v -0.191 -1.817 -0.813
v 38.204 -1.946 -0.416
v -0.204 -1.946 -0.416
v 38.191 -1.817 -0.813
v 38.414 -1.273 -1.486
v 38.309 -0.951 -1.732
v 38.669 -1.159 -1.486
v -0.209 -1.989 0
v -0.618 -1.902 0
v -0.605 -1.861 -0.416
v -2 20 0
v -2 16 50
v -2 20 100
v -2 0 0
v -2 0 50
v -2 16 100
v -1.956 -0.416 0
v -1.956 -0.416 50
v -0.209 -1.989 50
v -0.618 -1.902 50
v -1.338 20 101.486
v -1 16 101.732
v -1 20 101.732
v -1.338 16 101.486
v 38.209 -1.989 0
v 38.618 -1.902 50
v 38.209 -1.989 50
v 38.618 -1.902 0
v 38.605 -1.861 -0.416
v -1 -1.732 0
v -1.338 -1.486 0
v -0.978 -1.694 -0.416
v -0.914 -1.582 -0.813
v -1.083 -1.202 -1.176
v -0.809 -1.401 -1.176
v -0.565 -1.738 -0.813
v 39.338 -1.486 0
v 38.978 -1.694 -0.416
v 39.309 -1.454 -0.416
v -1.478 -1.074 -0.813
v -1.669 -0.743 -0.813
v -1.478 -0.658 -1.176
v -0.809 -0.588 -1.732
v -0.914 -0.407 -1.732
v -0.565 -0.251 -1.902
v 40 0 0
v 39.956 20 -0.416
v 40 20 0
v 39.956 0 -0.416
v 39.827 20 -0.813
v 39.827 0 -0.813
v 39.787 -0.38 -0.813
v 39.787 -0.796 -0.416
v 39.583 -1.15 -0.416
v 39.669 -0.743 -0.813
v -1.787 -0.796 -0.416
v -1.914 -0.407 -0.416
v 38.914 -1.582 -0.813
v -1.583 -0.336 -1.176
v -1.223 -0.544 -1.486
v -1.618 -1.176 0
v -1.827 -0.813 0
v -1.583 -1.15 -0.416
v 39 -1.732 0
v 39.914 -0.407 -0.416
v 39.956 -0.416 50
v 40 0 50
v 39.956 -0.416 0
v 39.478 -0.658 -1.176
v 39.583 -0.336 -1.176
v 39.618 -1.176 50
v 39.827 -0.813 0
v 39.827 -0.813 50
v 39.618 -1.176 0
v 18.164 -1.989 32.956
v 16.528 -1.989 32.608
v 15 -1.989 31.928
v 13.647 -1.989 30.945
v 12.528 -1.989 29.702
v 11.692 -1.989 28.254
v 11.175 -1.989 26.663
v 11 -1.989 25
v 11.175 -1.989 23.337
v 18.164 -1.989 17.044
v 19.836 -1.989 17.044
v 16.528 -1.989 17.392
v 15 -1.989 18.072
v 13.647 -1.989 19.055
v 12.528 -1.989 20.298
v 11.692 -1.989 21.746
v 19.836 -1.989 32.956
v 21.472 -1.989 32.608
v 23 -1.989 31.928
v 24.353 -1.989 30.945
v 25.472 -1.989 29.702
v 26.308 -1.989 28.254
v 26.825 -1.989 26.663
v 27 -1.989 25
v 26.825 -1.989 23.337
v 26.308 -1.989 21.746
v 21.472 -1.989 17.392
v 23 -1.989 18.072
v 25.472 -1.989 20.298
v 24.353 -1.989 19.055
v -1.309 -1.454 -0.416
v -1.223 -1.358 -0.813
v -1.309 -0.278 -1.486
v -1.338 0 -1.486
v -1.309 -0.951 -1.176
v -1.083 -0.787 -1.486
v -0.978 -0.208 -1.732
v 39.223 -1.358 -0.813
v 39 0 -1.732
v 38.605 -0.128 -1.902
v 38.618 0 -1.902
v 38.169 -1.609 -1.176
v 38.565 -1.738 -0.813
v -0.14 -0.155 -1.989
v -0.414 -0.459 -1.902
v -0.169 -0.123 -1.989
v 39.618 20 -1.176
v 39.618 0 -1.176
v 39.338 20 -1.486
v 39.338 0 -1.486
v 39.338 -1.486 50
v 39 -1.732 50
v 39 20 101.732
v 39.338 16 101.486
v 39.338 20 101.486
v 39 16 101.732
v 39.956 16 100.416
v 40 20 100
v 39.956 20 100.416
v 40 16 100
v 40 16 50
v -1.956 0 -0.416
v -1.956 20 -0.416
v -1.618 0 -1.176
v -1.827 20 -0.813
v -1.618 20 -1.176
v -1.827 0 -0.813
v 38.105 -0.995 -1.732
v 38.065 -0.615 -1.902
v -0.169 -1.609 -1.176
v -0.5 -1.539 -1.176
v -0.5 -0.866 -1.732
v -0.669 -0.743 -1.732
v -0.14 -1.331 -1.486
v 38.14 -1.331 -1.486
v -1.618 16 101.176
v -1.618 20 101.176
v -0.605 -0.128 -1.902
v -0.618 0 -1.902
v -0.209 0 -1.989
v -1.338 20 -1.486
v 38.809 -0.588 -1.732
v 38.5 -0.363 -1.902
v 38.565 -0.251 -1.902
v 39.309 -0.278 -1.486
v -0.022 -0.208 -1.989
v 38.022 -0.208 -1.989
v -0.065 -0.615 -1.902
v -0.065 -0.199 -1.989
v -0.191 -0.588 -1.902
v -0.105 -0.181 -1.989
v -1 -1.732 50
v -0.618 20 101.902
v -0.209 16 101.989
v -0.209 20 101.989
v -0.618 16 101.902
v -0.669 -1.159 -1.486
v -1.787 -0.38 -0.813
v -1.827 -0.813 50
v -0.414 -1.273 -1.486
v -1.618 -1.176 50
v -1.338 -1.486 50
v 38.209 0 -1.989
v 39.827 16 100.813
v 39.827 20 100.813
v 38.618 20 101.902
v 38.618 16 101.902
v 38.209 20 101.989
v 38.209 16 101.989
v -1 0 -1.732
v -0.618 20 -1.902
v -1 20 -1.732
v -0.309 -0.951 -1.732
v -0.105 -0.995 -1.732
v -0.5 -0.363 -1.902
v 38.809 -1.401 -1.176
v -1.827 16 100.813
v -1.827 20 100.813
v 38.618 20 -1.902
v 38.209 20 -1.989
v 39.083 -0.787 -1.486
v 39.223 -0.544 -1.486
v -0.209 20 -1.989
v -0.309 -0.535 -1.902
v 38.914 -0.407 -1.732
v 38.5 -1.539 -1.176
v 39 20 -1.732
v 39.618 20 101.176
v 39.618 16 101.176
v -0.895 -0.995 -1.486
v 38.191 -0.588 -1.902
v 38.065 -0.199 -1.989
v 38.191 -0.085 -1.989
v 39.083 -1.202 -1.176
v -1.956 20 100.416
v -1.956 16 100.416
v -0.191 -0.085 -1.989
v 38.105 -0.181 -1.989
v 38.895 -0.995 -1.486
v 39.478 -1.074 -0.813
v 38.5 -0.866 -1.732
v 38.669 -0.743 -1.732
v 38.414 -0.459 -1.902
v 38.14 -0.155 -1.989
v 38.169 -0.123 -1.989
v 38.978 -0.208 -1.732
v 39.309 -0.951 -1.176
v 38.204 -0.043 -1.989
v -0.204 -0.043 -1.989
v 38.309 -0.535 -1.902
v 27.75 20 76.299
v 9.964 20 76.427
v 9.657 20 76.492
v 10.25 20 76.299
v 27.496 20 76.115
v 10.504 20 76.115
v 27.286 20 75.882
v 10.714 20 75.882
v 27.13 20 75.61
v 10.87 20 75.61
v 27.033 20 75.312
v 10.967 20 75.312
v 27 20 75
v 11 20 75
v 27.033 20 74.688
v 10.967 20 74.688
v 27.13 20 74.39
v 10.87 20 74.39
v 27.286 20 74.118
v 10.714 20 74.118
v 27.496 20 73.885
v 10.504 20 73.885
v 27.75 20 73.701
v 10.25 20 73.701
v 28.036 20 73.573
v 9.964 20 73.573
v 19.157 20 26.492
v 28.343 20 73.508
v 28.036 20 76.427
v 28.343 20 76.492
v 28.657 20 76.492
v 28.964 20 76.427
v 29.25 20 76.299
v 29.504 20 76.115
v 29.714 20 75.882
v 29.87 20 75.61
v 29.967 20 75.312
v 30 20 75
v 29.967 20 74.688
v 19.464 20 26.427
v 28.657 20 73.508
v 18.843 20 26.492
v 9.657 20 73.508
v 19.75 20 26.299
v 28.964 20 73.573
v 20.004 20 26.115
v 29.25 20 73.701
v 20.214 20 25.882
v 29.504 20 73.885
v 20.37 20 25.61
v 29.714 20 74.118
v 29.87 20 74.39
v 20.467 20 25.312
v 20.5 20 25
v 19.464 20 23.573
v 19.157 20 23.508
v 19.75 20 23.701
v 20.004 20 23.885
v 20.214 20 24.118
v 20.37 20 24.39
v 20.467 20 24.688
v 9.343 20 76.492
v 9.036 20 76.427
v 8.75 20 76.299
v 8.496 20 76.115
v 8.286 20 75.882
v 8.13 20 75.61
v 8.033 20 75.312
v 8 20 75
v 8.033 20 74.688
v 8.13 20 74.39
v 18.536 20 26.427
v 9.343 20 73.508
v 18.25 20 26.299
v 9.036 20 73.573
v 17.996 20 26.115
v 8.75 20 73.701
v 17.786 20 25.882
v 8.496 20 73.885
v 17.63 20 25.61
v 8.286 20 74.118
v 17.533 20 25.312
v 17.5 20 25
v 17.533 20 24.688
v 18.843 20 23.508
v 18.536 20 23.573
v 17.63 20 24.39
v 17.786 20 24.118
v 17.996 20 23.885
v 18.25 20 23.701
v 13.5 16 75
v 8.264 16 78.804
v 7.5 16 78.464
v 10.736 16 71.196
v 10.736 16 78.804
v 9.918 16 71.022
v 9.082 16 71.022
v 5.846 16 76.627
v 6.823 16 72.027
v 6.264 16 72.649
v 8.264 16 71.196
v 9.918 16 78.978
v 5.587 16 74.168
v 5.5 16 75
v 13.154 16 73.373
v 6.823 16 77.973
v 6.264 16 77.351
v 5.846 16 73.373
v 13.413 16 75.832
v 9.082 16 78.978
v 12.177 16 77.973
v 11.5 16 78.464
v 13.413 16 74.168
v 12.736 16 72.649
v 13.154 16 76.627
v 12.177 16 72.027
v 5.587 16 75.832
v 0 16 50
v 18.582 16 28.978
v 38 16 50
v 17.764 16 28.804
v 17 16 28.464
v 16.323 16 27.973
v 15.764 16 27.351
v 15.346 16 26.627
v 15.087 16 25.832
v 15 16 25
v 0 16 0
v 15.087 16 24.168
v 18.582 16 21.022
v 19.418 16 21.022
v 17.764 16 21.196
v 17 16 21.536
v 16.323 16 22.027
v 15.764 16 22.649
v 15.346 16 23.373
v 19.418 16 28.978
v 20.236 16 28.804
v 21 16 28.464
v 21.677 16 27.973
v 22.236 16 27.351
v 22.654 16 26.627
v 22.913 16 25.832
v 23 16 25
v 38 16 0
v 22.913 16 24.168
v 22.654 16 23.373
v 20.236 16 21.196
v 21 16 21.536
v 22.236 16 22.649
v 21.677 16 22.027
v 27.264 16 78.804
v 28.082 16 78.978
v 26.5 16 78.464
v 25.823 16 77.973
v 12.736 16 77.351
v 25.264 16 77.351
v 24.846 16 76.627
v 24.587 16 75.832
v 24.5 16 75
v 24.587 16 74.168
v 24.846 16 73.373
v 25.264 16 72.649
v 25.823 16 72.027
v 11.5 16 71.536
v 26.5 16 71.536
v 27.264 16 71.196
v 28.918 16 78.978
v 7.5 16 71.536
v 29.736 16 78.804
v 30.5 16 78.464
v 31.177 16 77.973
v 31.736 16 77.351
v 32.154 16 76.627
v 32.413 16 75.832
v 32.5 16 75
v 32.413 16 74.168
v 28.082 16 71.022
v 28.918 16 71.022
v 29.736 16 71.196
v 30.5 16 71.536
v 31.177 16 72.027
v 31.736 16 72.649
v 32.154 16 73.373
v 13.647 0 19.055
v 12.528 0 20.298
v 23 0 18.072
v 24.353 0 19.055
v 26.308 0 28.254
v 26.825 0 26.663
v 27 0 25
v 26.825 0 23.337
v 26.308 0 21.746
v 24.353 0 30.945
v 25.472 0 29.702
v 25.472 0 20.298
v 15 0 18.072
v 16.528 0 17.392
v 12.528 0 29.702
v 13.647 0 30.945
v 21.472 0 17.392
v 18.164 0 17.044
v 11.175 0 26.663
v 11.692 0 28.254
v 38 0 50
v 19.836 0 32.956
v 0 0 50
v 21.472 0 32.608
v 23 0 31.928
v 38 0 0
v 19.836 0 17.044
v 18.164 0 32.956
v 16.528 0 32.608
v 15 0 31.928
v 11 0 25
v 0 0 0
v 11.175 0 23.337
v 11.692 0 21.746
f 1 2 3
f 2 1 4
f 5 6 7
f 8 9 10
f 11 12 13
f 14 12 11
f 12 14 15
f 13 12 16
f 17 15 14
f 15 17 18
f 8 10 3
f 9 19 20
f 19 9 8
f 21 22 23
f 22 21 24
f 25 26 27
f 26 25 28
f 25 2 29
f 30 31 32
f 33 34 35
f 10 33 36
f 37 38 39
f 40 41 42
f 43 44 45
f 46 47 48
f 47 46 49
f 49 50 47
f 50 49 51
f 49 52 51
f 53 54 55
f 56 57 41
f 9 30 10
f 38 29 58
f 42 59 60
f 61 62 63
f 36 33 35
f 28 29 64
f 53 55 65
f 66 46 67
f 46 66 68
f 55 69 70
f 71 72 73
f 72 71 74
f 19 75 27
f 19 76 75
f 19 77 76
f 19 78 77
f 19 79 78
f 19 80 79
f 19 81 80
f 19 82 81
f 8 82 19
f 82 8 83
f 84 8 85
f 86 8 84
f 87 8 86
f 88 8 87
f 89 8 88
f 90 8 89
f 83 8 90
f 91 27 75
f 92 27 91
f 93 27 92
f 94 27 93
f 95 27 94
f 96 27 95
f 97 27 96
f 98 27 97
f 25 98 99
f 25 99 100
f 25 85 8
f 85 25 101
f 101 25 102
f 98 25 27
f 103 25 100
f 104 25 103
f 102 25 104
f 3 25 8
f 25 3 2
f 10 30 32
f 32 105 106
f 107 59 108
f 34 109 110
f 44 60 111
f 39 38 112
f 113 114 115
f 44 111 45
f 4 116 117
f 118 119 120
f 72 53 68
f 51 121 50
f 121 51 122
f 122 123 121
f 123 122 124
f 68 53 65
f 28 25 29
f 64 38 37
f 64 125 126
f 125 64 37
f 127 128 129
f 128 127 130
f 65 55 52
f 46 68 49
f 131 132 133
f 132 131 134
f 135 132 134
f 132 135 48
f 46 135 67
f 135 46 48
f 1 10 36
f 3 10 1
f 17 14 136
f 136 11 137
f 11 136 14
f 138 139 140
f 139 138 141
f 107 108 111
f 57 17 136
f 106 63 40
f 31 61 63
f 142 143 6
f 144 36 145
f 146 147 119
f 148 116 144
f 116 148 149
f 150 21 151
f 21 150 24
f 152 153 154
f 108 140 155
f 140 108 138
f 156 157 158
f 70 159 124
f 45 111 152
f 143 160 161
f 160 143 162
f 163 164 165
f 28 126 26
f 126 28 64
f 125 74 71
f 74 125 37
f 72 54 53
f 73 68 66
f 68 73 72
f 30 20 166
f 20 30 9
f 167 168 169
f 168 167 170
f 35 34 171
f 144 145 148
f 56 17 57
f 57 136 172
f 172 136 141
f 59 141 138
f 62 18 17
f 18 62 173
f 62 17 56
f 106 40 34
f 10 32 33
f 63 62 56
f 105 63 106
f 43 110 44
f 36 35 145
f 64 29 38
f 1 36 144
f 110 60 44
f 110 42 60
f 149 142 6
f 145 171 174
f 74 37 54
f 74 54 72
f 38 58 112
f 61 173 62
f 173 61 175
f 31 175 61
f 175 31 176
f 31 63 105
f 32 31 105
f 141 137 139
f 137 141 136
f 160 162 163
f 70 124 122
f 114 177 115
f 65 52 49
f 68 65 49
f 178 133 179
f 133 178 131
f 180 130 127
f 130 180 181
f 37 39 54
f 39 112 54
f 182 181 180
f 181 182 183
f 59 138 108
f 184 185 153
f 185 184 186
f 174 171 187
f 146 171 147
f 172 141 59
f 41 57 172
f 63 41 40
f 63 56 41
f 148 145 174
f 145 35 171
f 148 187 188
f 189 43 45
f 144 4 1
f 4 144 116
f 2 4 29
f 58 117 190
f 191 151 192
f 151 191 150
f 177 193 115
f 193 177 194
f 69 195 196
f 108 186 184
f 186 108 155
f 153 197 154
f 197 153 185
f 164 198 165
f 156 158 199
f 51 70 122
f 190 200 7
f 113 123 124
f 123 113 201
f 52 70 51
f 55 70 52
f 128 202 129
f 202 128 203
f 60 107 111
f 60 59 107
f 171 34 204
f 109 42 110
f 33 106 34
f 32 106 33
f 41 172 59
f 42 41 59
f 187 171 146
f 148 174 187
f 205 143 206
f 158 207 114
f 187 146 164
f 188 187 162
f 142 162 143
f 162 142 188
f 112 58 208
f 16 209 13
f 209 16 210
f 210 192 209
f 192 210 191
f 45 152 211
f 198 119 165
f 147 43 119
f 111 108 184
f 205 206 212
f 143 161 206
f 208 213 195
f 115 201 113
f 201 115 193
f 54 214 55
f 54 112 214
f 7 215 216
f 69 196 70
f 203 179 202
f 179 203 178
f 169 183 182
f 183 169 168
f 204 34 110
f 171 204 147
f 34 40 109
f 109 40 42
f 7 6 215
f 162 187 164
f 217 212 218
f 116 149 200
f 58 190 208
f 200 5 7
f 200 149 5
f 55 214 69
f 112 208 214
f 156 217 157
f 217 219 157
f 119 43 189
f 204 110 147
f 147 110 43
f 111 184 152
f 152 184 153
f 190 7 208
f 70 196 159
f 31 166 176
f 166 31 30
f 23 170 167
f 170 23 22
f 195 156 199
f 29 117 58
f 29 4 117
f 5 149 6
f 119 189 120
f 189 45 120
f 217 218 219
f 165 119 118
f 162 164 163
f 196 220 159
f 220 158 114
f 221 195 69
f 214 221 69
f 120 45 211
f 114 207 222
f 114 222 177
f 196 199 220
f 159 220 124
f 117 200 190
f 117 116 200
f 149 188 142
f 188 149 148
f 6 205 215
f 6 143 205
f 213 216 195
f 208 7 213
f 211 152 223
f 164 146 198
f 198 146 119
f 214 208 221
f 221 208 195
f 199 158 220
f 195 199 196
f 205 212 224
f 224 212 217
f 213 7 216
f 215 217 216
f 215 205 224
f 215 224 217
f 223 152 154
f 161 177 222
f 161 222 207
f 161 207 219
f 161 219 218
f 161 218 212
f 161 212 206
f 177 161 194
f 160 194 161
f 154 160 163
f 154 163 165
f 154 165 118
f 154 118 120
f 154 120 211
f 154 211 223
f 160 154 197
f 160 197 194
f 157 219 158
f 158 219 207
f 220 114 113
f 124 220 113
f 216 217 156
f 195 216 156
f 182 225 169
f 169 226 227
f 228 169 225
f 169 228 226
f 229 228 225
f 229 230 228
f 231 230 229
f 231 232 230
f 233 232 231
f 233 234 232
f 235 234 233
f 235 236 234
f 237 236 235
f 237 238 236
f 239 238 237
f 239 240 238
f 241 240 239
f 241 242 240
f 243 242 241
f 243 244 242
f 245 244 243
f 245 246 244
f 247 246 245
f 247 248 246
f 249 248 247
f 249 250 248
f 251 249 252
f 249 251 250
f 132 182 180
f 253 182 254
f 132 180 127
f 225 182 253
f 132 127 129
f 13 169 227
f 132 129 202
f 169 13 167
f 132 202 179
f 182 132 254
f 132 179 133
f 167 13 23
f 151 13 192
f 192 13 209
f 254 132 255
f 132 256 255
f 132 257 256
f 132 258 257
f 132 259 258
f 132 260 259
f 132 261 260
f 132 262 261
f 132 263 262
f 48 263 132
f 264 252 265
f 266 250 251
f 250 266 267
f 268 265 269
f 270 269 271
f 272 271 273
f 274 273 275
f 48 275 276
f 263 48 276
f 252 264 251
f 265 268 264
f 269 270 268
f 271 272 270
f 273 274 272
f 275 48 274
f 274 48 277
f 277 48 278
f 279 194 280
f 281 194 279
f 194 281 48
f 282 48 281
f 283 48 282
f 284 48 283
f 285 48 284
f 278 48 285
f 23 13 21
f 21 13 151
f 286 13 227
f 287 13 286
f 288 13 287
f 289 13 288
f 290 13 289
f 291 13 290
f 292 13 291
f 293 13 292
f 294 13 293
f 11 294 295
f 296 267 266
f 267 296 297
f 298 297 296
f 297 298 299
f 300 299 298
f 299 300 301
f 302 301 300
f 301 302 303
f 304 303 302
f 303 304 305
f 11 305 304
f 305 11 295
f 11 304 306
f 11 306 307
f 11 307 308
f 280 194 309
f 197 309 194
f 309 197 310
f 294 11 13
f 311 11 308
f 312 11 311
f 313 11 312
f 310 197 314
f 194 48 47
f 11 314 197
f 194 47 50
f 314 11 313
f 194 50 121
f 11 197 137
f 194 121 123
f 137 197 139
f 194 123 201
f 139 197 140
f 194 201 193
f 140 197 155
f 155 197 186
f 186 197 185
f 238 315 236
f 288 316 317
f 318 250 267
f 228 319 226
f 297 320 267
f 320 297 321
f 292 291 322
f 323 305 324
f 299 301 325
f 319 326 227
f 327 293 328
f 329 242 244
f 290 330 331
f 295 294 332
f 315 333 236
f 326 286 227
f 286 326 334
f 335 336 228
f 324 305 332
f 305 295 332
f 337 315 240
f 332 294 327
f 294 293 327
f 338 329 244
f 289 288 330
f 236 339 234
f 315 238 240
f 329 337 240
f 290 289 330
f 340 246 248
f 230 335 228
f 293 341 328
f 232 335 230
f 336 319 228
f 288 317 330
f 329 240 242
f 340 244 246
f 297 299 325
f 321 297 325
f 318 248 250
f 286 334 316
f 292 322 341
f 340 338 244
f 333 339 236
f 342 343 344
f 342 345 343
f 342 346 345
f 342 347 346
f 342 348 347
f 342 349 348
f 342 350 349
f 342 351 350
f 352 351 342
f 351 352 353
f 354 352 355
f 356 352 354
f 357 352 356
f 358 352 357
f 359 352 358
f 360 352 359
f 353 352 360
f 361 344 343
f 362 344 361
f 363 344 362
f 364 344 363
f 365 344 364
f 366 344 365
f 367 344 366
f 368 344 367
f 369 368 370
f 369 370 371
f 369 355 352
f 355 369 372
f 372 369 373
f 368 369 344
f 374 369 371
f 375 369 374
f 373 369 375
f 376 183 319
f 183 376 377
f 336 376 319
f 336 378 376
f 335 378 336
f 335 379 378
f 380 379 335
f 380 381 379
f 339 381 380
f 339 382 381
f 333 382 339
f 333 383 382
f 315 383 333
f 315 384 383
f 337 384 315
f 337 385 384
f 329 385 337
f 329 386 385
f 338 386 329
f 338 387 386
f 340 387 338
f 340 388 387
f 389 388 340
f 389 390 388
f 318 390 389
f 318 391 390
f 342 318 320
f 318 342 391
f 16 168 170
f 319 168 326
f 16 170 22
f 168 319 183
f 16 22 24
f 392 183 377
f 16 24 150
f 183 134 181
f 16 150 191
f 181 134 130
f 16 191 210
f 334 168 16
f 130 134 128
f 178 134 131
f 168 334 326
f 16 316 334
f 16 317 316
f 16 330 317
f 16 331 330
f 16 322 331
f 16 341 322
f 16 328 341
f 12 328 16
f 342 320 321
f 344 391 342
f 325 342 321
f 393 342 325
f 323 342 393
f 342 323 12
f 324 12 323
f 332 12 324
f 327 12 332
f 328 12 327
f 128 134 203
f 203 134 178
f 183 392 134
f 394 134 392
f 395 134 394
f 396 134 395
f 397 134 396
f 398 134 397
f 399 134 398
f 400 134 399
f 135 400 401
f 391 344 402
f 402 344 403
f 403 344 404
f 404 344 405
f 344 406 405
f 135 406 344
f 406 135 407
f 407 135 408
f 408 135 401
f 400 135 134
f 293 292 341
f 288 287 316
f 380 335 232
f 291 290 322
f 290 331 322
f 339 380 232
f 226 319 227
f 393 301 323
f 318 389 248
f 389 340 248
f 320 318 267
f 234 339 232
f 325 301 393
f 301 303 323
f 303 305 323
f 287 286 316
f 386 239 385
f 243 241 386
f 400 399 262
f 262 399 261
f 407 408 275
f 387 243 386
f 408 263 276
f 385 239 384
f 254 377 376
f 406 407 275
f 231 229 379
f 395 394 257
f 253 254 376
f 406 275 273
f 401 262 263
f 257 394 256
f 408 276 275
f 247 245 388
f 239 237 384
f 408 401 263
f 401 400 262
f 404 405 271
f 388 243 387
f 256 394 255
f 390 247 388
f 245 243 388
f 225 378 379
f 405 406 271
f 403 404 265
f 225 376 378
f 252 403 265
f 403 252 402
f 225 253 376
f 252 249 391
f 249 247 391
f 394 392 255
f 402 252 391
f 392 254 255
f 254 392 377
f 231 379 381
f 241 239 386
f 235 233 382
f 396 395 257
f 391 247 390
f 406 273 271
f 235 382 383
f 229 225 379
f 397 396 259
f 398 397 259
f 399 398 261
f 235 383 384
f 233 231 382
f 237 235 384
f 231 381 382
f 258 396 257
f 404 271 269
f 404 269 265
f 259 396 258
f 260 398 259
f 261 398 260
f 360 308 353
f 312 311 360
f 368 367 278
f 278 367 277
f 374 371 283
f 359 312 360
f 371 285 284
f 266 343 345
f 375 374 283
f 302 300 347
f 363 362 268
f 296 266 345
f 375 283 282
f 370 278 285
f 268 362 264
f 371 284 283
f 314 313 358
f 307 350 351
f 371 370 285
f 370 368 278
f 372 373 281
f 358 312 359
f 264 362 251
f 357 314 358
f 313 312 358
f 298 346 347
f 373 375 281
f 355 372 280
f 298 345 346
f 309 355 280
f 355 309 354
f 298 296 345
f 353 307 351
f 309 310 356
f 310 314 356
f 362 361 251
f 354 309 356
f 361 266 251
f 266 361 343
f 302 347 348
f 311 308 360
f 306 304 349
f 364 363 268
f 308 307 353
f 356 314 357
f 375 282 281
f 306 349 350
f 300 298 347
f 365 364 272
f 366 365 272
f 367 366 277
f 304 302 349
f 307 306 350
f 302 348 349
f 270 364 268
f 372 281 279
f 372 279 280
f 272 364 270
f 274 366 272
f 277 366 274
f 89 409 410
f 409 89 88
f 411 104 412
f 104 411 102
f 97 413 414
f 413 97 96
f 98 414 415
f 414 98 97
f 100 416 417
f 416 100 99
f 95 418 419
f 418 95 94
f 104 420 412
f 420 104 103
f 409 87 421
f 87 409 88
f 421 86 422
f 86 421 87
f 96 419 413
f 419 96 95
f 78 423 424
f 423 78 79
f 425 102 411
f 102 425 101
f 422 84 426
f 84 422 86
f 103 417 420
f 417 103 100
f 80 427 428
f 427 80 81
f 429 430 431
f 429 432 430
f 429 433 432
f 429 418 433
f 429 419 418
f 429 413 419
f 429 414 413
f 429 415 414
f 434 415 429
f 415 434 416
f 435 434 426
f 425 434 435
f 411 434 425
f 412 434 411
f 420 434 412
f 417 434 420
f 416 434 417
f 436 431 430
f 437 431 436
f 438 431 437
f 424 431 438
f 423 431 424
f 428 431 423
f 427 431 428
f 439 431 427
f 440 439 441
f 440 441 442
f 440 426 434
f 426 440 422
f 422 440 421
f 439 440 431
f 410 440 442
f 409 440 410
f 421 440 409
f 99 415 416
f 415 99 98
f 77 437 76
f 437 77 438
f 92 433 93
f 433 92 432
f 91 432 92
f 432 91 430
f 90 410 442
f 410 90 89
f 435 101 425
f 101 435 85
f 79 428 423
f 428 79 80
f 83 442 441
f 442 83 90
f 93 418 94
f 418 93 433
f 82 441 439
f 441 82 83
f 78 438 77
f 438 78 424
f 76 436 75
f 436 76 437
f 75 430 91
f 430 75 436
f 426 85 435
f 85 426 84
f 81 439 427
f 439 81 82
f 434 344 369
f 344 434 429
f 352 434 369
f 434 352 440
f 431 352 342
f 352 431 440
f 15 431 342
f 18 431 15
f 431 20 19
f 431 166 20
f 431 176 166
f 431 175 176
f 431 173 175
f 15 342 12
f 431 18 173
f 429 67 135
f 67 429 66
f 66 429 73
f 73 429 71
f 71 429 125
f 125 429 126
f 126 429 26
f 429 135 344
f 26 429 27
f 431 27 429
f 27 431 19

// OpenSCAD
/* [Remote dimensions] */

// Standing up remote control's width 
$remote_width = 38;
// Standing up remote control's depth 
$remote_depth = 16;
// Standing up remote control's height 
$remote_height = 100;

/* [Holder remote container height] */
// Height of remote control holding part
$remote_holder_height = 50;

/* [Holder thicknesses] */
// Holder borders thickness
$box_thickness = 2;
// Holder wall side border thickness
$box_back_thickness = 4;

/* [Screw diameters] */
// Screw shank diameter
$screw_shank_diameter = 3;
// Screw head diameter
$screw_head_diameter = 8;

/* [Screw access diameter] */
// Front hole diameter (large enough to pass the screwdriver)
$front_hole_diameter = 16;

/* [Screw positions] */
// Screw top position (this model will ensure the top screw holes to be accessible)
$screw_top_position = 75;
// Screw bottom position
$screw_bottom_position = 25;

/* [Hidden] */
$fs = 0.1;

module cylinder_x90(h, r, r1, r2) {
  rotate([90,0,0]) cylinder(h=h, r=r, r1=r1, r2=r2);
};
module screw_hole() {
  cylinder_x90(
    h=$box_back_thickness, 
    r1=$screw_shank_diameter / 2, 
    r2=$screw_head_diameter / 2
  );
};

module whole_box() {
  minkowski() {
    cube([$remote_width, $remote_depth+$box_back_thickness, $remote_height]);
    sphere($box_thickness);
  }
};

module rectified_wall_box() {
  difference() {
    whole_box();
    translate([-$box_thickness, $remote_depth + $box_back_thickness, -$box_thickness]) 
      cube([$remote_width + 2 * $box_thickness, $box_thickness, $remote_height + 2 * $box_thickness]);
  }
};

difference() {
  rectified_wall_box();
  cube([$remote_width, $remote_depth, $remote_height]);
  translate([-$box_thickness, -$box_thickness, max(min($remote_holder_height, $remote_height - $screw_head_diameter), $front_hole_diameter + $box_thickness)]) 
    cube([
      $remote_width + 2 * $box_thickness, 
      $remote_depth + $box_thickness, 
      $remote_height + $box_thickness
    ]);
  $remote_half_width = $remote_width / 2;
  translate([$remote_half_width, 0, 0]) {
    translate([0, $remote_depth + $box_back_thickness, min(max($screw_top_position, $remote_holder_height + $screw_head_diameter / 2), $remote_height - $screw_head_diameter/2)]) {
      translate([-$remote_half_width / 2, 0, 0]) screw_hole();
      translate([$remote_half_width / 2, 0, 0]) screw_hole();
    }
    translate([0, 0, max($front_hole_diameter/2, min($screw_bottom_position, $remote_holder_height - $front_hole_diameter/2))]) {
      translate([0, $remote_depth + $box_back_thickness, 0]) screw_hole();
      cylinder_x90(h=$box_thickness, r=$front_hole_diameter / 2);
    }
  }
}
